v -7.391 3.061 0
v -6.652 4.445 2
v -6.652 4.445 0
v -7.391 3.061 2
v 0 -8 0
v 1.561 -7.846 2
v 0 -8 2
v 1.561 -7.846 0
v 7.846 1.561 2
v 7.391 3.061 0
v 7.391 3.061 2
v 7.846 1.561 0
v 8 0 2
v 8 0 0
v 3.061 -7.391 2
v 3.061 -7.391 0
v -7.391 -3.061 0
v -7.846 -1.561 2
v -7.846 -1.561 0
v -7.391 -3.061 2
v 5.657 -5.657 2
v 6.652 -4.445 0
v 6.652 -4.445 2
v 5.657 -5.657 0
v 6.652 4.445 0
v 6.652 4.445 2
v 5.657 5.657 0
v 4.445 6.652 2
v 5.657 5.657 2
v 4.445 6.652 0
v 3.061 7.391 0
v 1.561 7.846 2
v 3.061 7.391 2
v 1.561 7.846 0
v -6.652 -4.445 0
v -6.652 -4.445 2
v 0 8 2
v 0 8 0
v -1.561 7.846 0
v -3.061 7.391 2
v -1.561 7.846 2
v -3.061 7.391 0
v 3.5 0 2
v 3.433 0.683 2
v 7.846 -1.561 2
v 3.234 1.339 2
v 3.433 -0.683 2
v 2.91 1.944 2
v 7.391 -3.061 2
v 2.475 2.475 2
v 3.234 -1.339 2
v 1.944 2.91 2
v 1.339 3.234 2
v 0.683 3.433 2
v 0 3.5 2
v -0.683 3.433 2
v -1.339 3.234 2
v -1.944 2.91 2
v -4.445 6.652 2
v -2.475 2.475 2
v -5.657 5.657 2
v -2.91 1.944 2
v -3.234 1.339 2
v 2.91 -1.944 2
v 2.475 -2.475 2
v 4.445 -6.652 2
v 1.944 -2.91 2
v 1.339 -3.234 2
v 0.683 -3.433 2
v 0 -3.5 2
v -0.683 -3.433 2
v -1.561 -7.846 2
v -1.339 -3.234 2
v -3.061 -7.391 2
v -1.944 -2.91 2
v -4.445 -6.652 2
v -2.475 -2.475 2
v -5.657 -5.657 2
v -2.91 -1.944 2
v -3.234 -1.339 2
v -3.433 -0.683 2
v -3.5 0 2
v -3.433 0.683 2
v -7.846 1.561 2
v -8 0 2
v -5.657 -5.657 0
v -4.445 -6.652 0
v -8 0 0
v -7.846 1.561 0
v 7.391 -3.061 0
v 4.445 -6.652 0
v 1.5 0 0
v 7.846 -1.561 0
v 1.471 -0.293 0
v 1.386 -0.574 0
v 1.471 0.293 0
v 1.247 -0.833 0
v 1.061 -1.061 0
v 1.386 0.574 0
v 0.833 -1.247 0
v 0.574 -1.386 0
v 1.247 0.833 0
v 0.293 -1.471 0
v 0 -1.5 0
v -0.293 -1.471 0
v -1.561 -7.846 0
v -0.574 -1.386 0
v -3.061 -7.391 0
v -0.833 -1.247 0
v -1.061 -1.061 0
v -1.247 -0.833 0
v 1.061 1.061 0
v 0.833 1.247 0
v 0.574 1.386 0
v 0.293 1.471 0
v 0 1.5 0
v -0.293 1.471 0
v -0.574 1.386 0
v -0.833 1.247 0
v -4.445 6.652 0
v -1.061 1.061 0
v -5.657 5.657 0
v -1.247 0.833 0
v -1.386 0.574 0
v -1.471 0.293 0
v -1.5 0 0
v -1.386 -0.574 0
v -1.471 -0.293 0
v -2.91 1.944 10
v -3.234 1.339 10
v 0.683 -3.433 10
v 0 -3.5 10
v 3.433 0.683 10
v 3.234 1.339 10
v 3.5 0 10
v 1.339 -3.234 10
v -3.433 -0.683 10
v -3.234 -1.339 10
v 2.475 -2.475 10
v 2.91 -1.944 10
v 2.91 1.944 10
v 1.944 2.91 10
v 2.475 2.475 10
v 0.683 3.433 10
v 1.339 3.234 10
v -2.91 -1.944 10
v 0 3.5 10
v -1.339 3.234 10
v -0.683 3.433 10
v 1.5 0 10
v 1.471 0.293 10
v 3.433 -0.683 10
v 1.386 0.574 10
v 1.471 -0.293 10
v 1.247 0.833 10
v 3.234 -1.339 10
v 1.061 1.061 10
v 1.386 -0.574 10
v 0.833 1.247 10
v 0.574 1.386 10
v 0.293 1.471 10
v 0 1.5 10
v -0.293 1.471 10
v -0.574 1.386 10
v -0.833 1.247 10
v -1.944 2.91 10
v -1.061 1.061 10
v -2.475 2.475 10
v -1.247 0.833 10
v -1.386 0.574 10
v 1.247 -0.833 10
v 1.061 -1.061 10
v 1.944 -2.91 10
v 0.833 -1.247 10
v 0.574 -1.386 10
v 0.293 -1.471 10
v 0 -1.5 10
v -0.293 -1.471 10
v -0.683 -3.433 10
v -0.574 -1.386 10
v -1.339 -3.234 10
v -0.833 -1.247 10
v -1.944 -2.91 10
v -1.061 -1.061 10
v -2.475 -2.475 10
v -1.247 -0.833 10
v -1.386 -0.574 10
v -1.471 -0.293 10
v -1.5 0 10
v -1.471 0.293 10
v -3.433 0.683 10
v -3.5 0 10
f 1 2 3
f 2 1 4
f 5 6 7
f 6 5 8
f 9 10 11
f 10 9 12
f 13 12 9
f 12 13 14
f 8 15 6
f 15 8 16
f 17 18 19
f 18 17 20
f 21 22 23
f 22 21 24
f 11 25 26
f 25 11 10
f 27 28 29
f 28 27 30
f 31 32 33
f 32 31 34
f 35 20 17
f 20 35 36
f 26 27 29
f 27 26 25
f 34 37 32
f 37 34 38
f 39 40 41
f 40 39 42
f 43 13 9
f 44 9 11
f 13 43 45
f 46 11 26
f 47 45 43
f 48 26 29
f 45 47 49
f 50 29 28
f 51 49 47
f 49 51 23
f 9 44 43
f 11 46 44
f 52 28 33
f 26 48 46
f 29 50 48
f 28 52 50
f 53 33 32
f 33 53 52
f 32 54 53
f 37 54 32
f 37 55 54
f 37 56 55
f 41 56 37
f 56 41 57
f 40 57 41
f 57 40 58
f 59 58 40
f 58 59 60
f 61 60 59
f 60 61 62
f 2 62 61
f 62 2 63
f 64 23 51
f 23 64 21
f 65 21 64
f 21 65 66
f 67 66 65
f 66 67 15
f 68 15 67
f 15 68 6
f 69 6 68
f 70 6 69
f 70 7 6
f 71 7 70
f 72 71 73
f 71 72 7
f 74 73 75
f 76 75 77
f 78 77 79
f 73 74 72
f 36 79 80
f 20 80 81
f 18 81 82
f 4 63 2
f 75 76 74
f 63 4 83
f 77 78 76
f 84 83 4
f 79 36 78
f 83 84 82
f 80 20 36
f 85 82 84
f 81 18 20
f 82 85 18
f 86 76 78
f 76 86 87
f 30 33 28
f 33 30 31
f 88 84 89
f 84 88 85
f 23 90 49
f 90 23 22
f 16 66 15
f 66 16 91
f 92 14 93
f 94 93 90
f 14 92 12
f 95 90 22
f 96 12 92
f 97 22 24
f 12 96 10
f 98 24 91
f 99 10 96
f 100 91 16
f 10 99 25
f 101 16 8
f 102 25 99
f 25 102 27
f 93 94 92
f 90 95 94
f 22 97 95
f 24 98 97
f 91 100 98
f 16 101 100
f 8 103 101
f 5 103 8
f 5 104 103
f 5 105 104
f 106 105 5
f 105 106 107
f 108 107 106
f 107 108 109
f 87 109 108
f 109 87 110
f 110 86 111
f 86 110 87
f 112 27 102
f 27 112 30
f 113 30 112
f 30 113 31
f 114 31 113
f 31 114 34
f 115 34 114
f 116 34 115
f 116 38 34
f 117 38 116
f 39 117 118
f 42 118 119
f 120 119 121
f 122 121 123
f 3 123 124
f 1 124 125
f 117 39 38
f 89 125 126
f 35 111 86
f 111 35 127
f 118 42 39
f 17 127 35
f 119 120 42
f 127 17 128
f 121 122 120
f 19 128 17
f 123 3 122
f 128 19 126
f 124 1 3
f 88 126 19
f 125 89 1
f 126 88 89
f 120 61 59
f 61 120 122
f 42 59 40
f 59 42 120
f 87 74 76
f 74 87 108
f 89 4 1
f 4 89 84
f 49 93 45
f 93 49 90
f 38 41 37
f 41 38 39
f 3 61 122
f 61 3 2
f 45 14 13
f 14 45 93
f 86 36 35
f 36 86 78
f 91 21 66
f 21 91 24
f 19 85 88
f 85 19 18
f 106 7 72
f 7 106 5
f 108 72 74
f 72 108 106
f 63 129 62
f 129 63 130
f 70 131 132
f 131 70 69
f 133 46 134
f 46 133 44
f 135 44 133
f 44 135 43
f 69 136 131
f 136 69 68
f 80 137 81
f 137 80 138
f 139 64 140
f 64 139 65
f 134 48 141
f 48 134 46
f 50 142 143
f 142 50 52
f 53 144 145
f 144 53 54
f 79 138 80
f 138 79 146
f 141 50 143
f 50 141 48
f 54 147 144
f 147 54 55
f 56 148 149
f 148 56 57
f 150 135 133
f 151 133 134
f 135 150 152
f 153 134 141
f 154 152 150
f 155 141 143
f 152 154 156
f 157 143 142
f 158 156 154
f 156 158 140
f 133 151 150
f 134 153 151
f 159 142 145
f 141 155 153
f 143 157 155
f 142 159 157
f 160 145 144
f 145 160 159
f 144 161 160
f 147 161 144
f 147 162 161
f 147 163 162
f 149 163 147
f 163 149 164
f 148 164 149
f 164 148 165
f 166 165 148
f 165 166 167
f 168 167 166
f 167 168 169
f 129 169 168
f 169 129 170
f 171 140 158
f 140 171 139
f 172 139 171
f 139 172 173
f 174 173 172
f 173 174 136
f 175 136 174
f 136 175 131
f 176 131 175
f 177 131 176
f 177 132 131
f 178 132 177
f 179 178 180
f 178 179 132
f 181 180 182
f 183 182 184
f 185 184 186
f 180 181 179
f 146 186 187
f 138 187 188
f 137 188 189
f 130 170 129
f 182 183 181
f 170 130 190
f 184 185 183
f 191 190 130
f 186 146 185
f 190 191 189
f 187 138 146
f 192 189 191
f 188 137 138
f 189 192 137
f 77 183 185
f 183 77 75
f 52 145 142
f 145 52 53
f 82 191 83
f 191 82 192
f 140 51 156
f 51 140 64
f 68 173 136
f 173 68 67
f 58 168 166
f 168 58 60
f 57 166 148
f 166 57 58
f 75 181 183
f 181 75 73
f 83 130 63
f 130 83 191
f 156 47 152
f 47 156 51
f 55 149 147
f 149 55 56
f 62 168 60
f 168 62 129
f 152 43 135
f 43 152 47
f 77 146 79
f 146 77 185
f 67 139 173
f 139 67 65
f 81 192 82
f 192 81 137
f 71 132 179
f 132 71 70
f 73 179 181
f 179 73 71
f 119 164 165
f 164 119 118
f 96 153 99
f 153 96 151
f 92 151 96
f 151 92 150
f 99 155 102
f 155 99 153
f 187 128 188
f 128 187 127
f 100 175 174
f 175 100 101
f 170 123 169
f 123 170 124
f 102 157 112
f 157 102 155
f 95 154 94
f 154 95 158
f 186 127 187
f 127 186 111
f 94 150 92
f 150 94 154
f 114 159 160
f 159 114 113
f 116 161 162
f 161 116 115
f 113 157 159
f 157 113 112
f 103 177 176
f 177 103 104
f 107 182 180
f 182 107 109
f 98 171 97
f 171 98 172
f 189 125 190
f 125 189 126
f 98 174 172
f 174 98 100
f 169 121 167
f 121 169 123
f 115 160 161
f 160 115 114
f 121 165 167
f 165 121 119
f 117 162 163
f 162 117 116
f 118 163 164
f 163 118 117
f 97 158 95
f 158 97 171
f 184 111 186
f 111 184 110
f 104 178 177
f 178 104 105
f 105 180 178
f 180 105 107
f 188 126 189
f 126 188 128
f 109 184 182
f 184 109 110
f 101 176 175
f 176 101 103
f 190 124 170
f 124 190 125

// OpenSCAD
$fn = 32;

// ----------------------------------------------------------------------
// Micro post: flanged post, 5-20 mm class
// ----------------------------------------------------------------------

// --- parameters (mm) ---
post_d = 7;               // post diameter
post_h = 8;               // post height above the flange
flange_d = 16;            // flange diameter
flange_t = 2;             // flange thickness
bore_d = 3;               // through bore
fit_tol = 0.05;           // tolerance for press fits, mm
free_tol = 0.3;           // tolerance for clearance fits, mm

total_h = post_h + flange_t;  // overall height

difference() {
  union() {
    cylinder(h = flange_t, d = flange_d);
    translate([0, 0, flange_t]) cylinder(h = post_h, d = post_d);
  }
  translate([0, 0, -1]) cylinder(h = total_h + 2, d = bore_d);
}
